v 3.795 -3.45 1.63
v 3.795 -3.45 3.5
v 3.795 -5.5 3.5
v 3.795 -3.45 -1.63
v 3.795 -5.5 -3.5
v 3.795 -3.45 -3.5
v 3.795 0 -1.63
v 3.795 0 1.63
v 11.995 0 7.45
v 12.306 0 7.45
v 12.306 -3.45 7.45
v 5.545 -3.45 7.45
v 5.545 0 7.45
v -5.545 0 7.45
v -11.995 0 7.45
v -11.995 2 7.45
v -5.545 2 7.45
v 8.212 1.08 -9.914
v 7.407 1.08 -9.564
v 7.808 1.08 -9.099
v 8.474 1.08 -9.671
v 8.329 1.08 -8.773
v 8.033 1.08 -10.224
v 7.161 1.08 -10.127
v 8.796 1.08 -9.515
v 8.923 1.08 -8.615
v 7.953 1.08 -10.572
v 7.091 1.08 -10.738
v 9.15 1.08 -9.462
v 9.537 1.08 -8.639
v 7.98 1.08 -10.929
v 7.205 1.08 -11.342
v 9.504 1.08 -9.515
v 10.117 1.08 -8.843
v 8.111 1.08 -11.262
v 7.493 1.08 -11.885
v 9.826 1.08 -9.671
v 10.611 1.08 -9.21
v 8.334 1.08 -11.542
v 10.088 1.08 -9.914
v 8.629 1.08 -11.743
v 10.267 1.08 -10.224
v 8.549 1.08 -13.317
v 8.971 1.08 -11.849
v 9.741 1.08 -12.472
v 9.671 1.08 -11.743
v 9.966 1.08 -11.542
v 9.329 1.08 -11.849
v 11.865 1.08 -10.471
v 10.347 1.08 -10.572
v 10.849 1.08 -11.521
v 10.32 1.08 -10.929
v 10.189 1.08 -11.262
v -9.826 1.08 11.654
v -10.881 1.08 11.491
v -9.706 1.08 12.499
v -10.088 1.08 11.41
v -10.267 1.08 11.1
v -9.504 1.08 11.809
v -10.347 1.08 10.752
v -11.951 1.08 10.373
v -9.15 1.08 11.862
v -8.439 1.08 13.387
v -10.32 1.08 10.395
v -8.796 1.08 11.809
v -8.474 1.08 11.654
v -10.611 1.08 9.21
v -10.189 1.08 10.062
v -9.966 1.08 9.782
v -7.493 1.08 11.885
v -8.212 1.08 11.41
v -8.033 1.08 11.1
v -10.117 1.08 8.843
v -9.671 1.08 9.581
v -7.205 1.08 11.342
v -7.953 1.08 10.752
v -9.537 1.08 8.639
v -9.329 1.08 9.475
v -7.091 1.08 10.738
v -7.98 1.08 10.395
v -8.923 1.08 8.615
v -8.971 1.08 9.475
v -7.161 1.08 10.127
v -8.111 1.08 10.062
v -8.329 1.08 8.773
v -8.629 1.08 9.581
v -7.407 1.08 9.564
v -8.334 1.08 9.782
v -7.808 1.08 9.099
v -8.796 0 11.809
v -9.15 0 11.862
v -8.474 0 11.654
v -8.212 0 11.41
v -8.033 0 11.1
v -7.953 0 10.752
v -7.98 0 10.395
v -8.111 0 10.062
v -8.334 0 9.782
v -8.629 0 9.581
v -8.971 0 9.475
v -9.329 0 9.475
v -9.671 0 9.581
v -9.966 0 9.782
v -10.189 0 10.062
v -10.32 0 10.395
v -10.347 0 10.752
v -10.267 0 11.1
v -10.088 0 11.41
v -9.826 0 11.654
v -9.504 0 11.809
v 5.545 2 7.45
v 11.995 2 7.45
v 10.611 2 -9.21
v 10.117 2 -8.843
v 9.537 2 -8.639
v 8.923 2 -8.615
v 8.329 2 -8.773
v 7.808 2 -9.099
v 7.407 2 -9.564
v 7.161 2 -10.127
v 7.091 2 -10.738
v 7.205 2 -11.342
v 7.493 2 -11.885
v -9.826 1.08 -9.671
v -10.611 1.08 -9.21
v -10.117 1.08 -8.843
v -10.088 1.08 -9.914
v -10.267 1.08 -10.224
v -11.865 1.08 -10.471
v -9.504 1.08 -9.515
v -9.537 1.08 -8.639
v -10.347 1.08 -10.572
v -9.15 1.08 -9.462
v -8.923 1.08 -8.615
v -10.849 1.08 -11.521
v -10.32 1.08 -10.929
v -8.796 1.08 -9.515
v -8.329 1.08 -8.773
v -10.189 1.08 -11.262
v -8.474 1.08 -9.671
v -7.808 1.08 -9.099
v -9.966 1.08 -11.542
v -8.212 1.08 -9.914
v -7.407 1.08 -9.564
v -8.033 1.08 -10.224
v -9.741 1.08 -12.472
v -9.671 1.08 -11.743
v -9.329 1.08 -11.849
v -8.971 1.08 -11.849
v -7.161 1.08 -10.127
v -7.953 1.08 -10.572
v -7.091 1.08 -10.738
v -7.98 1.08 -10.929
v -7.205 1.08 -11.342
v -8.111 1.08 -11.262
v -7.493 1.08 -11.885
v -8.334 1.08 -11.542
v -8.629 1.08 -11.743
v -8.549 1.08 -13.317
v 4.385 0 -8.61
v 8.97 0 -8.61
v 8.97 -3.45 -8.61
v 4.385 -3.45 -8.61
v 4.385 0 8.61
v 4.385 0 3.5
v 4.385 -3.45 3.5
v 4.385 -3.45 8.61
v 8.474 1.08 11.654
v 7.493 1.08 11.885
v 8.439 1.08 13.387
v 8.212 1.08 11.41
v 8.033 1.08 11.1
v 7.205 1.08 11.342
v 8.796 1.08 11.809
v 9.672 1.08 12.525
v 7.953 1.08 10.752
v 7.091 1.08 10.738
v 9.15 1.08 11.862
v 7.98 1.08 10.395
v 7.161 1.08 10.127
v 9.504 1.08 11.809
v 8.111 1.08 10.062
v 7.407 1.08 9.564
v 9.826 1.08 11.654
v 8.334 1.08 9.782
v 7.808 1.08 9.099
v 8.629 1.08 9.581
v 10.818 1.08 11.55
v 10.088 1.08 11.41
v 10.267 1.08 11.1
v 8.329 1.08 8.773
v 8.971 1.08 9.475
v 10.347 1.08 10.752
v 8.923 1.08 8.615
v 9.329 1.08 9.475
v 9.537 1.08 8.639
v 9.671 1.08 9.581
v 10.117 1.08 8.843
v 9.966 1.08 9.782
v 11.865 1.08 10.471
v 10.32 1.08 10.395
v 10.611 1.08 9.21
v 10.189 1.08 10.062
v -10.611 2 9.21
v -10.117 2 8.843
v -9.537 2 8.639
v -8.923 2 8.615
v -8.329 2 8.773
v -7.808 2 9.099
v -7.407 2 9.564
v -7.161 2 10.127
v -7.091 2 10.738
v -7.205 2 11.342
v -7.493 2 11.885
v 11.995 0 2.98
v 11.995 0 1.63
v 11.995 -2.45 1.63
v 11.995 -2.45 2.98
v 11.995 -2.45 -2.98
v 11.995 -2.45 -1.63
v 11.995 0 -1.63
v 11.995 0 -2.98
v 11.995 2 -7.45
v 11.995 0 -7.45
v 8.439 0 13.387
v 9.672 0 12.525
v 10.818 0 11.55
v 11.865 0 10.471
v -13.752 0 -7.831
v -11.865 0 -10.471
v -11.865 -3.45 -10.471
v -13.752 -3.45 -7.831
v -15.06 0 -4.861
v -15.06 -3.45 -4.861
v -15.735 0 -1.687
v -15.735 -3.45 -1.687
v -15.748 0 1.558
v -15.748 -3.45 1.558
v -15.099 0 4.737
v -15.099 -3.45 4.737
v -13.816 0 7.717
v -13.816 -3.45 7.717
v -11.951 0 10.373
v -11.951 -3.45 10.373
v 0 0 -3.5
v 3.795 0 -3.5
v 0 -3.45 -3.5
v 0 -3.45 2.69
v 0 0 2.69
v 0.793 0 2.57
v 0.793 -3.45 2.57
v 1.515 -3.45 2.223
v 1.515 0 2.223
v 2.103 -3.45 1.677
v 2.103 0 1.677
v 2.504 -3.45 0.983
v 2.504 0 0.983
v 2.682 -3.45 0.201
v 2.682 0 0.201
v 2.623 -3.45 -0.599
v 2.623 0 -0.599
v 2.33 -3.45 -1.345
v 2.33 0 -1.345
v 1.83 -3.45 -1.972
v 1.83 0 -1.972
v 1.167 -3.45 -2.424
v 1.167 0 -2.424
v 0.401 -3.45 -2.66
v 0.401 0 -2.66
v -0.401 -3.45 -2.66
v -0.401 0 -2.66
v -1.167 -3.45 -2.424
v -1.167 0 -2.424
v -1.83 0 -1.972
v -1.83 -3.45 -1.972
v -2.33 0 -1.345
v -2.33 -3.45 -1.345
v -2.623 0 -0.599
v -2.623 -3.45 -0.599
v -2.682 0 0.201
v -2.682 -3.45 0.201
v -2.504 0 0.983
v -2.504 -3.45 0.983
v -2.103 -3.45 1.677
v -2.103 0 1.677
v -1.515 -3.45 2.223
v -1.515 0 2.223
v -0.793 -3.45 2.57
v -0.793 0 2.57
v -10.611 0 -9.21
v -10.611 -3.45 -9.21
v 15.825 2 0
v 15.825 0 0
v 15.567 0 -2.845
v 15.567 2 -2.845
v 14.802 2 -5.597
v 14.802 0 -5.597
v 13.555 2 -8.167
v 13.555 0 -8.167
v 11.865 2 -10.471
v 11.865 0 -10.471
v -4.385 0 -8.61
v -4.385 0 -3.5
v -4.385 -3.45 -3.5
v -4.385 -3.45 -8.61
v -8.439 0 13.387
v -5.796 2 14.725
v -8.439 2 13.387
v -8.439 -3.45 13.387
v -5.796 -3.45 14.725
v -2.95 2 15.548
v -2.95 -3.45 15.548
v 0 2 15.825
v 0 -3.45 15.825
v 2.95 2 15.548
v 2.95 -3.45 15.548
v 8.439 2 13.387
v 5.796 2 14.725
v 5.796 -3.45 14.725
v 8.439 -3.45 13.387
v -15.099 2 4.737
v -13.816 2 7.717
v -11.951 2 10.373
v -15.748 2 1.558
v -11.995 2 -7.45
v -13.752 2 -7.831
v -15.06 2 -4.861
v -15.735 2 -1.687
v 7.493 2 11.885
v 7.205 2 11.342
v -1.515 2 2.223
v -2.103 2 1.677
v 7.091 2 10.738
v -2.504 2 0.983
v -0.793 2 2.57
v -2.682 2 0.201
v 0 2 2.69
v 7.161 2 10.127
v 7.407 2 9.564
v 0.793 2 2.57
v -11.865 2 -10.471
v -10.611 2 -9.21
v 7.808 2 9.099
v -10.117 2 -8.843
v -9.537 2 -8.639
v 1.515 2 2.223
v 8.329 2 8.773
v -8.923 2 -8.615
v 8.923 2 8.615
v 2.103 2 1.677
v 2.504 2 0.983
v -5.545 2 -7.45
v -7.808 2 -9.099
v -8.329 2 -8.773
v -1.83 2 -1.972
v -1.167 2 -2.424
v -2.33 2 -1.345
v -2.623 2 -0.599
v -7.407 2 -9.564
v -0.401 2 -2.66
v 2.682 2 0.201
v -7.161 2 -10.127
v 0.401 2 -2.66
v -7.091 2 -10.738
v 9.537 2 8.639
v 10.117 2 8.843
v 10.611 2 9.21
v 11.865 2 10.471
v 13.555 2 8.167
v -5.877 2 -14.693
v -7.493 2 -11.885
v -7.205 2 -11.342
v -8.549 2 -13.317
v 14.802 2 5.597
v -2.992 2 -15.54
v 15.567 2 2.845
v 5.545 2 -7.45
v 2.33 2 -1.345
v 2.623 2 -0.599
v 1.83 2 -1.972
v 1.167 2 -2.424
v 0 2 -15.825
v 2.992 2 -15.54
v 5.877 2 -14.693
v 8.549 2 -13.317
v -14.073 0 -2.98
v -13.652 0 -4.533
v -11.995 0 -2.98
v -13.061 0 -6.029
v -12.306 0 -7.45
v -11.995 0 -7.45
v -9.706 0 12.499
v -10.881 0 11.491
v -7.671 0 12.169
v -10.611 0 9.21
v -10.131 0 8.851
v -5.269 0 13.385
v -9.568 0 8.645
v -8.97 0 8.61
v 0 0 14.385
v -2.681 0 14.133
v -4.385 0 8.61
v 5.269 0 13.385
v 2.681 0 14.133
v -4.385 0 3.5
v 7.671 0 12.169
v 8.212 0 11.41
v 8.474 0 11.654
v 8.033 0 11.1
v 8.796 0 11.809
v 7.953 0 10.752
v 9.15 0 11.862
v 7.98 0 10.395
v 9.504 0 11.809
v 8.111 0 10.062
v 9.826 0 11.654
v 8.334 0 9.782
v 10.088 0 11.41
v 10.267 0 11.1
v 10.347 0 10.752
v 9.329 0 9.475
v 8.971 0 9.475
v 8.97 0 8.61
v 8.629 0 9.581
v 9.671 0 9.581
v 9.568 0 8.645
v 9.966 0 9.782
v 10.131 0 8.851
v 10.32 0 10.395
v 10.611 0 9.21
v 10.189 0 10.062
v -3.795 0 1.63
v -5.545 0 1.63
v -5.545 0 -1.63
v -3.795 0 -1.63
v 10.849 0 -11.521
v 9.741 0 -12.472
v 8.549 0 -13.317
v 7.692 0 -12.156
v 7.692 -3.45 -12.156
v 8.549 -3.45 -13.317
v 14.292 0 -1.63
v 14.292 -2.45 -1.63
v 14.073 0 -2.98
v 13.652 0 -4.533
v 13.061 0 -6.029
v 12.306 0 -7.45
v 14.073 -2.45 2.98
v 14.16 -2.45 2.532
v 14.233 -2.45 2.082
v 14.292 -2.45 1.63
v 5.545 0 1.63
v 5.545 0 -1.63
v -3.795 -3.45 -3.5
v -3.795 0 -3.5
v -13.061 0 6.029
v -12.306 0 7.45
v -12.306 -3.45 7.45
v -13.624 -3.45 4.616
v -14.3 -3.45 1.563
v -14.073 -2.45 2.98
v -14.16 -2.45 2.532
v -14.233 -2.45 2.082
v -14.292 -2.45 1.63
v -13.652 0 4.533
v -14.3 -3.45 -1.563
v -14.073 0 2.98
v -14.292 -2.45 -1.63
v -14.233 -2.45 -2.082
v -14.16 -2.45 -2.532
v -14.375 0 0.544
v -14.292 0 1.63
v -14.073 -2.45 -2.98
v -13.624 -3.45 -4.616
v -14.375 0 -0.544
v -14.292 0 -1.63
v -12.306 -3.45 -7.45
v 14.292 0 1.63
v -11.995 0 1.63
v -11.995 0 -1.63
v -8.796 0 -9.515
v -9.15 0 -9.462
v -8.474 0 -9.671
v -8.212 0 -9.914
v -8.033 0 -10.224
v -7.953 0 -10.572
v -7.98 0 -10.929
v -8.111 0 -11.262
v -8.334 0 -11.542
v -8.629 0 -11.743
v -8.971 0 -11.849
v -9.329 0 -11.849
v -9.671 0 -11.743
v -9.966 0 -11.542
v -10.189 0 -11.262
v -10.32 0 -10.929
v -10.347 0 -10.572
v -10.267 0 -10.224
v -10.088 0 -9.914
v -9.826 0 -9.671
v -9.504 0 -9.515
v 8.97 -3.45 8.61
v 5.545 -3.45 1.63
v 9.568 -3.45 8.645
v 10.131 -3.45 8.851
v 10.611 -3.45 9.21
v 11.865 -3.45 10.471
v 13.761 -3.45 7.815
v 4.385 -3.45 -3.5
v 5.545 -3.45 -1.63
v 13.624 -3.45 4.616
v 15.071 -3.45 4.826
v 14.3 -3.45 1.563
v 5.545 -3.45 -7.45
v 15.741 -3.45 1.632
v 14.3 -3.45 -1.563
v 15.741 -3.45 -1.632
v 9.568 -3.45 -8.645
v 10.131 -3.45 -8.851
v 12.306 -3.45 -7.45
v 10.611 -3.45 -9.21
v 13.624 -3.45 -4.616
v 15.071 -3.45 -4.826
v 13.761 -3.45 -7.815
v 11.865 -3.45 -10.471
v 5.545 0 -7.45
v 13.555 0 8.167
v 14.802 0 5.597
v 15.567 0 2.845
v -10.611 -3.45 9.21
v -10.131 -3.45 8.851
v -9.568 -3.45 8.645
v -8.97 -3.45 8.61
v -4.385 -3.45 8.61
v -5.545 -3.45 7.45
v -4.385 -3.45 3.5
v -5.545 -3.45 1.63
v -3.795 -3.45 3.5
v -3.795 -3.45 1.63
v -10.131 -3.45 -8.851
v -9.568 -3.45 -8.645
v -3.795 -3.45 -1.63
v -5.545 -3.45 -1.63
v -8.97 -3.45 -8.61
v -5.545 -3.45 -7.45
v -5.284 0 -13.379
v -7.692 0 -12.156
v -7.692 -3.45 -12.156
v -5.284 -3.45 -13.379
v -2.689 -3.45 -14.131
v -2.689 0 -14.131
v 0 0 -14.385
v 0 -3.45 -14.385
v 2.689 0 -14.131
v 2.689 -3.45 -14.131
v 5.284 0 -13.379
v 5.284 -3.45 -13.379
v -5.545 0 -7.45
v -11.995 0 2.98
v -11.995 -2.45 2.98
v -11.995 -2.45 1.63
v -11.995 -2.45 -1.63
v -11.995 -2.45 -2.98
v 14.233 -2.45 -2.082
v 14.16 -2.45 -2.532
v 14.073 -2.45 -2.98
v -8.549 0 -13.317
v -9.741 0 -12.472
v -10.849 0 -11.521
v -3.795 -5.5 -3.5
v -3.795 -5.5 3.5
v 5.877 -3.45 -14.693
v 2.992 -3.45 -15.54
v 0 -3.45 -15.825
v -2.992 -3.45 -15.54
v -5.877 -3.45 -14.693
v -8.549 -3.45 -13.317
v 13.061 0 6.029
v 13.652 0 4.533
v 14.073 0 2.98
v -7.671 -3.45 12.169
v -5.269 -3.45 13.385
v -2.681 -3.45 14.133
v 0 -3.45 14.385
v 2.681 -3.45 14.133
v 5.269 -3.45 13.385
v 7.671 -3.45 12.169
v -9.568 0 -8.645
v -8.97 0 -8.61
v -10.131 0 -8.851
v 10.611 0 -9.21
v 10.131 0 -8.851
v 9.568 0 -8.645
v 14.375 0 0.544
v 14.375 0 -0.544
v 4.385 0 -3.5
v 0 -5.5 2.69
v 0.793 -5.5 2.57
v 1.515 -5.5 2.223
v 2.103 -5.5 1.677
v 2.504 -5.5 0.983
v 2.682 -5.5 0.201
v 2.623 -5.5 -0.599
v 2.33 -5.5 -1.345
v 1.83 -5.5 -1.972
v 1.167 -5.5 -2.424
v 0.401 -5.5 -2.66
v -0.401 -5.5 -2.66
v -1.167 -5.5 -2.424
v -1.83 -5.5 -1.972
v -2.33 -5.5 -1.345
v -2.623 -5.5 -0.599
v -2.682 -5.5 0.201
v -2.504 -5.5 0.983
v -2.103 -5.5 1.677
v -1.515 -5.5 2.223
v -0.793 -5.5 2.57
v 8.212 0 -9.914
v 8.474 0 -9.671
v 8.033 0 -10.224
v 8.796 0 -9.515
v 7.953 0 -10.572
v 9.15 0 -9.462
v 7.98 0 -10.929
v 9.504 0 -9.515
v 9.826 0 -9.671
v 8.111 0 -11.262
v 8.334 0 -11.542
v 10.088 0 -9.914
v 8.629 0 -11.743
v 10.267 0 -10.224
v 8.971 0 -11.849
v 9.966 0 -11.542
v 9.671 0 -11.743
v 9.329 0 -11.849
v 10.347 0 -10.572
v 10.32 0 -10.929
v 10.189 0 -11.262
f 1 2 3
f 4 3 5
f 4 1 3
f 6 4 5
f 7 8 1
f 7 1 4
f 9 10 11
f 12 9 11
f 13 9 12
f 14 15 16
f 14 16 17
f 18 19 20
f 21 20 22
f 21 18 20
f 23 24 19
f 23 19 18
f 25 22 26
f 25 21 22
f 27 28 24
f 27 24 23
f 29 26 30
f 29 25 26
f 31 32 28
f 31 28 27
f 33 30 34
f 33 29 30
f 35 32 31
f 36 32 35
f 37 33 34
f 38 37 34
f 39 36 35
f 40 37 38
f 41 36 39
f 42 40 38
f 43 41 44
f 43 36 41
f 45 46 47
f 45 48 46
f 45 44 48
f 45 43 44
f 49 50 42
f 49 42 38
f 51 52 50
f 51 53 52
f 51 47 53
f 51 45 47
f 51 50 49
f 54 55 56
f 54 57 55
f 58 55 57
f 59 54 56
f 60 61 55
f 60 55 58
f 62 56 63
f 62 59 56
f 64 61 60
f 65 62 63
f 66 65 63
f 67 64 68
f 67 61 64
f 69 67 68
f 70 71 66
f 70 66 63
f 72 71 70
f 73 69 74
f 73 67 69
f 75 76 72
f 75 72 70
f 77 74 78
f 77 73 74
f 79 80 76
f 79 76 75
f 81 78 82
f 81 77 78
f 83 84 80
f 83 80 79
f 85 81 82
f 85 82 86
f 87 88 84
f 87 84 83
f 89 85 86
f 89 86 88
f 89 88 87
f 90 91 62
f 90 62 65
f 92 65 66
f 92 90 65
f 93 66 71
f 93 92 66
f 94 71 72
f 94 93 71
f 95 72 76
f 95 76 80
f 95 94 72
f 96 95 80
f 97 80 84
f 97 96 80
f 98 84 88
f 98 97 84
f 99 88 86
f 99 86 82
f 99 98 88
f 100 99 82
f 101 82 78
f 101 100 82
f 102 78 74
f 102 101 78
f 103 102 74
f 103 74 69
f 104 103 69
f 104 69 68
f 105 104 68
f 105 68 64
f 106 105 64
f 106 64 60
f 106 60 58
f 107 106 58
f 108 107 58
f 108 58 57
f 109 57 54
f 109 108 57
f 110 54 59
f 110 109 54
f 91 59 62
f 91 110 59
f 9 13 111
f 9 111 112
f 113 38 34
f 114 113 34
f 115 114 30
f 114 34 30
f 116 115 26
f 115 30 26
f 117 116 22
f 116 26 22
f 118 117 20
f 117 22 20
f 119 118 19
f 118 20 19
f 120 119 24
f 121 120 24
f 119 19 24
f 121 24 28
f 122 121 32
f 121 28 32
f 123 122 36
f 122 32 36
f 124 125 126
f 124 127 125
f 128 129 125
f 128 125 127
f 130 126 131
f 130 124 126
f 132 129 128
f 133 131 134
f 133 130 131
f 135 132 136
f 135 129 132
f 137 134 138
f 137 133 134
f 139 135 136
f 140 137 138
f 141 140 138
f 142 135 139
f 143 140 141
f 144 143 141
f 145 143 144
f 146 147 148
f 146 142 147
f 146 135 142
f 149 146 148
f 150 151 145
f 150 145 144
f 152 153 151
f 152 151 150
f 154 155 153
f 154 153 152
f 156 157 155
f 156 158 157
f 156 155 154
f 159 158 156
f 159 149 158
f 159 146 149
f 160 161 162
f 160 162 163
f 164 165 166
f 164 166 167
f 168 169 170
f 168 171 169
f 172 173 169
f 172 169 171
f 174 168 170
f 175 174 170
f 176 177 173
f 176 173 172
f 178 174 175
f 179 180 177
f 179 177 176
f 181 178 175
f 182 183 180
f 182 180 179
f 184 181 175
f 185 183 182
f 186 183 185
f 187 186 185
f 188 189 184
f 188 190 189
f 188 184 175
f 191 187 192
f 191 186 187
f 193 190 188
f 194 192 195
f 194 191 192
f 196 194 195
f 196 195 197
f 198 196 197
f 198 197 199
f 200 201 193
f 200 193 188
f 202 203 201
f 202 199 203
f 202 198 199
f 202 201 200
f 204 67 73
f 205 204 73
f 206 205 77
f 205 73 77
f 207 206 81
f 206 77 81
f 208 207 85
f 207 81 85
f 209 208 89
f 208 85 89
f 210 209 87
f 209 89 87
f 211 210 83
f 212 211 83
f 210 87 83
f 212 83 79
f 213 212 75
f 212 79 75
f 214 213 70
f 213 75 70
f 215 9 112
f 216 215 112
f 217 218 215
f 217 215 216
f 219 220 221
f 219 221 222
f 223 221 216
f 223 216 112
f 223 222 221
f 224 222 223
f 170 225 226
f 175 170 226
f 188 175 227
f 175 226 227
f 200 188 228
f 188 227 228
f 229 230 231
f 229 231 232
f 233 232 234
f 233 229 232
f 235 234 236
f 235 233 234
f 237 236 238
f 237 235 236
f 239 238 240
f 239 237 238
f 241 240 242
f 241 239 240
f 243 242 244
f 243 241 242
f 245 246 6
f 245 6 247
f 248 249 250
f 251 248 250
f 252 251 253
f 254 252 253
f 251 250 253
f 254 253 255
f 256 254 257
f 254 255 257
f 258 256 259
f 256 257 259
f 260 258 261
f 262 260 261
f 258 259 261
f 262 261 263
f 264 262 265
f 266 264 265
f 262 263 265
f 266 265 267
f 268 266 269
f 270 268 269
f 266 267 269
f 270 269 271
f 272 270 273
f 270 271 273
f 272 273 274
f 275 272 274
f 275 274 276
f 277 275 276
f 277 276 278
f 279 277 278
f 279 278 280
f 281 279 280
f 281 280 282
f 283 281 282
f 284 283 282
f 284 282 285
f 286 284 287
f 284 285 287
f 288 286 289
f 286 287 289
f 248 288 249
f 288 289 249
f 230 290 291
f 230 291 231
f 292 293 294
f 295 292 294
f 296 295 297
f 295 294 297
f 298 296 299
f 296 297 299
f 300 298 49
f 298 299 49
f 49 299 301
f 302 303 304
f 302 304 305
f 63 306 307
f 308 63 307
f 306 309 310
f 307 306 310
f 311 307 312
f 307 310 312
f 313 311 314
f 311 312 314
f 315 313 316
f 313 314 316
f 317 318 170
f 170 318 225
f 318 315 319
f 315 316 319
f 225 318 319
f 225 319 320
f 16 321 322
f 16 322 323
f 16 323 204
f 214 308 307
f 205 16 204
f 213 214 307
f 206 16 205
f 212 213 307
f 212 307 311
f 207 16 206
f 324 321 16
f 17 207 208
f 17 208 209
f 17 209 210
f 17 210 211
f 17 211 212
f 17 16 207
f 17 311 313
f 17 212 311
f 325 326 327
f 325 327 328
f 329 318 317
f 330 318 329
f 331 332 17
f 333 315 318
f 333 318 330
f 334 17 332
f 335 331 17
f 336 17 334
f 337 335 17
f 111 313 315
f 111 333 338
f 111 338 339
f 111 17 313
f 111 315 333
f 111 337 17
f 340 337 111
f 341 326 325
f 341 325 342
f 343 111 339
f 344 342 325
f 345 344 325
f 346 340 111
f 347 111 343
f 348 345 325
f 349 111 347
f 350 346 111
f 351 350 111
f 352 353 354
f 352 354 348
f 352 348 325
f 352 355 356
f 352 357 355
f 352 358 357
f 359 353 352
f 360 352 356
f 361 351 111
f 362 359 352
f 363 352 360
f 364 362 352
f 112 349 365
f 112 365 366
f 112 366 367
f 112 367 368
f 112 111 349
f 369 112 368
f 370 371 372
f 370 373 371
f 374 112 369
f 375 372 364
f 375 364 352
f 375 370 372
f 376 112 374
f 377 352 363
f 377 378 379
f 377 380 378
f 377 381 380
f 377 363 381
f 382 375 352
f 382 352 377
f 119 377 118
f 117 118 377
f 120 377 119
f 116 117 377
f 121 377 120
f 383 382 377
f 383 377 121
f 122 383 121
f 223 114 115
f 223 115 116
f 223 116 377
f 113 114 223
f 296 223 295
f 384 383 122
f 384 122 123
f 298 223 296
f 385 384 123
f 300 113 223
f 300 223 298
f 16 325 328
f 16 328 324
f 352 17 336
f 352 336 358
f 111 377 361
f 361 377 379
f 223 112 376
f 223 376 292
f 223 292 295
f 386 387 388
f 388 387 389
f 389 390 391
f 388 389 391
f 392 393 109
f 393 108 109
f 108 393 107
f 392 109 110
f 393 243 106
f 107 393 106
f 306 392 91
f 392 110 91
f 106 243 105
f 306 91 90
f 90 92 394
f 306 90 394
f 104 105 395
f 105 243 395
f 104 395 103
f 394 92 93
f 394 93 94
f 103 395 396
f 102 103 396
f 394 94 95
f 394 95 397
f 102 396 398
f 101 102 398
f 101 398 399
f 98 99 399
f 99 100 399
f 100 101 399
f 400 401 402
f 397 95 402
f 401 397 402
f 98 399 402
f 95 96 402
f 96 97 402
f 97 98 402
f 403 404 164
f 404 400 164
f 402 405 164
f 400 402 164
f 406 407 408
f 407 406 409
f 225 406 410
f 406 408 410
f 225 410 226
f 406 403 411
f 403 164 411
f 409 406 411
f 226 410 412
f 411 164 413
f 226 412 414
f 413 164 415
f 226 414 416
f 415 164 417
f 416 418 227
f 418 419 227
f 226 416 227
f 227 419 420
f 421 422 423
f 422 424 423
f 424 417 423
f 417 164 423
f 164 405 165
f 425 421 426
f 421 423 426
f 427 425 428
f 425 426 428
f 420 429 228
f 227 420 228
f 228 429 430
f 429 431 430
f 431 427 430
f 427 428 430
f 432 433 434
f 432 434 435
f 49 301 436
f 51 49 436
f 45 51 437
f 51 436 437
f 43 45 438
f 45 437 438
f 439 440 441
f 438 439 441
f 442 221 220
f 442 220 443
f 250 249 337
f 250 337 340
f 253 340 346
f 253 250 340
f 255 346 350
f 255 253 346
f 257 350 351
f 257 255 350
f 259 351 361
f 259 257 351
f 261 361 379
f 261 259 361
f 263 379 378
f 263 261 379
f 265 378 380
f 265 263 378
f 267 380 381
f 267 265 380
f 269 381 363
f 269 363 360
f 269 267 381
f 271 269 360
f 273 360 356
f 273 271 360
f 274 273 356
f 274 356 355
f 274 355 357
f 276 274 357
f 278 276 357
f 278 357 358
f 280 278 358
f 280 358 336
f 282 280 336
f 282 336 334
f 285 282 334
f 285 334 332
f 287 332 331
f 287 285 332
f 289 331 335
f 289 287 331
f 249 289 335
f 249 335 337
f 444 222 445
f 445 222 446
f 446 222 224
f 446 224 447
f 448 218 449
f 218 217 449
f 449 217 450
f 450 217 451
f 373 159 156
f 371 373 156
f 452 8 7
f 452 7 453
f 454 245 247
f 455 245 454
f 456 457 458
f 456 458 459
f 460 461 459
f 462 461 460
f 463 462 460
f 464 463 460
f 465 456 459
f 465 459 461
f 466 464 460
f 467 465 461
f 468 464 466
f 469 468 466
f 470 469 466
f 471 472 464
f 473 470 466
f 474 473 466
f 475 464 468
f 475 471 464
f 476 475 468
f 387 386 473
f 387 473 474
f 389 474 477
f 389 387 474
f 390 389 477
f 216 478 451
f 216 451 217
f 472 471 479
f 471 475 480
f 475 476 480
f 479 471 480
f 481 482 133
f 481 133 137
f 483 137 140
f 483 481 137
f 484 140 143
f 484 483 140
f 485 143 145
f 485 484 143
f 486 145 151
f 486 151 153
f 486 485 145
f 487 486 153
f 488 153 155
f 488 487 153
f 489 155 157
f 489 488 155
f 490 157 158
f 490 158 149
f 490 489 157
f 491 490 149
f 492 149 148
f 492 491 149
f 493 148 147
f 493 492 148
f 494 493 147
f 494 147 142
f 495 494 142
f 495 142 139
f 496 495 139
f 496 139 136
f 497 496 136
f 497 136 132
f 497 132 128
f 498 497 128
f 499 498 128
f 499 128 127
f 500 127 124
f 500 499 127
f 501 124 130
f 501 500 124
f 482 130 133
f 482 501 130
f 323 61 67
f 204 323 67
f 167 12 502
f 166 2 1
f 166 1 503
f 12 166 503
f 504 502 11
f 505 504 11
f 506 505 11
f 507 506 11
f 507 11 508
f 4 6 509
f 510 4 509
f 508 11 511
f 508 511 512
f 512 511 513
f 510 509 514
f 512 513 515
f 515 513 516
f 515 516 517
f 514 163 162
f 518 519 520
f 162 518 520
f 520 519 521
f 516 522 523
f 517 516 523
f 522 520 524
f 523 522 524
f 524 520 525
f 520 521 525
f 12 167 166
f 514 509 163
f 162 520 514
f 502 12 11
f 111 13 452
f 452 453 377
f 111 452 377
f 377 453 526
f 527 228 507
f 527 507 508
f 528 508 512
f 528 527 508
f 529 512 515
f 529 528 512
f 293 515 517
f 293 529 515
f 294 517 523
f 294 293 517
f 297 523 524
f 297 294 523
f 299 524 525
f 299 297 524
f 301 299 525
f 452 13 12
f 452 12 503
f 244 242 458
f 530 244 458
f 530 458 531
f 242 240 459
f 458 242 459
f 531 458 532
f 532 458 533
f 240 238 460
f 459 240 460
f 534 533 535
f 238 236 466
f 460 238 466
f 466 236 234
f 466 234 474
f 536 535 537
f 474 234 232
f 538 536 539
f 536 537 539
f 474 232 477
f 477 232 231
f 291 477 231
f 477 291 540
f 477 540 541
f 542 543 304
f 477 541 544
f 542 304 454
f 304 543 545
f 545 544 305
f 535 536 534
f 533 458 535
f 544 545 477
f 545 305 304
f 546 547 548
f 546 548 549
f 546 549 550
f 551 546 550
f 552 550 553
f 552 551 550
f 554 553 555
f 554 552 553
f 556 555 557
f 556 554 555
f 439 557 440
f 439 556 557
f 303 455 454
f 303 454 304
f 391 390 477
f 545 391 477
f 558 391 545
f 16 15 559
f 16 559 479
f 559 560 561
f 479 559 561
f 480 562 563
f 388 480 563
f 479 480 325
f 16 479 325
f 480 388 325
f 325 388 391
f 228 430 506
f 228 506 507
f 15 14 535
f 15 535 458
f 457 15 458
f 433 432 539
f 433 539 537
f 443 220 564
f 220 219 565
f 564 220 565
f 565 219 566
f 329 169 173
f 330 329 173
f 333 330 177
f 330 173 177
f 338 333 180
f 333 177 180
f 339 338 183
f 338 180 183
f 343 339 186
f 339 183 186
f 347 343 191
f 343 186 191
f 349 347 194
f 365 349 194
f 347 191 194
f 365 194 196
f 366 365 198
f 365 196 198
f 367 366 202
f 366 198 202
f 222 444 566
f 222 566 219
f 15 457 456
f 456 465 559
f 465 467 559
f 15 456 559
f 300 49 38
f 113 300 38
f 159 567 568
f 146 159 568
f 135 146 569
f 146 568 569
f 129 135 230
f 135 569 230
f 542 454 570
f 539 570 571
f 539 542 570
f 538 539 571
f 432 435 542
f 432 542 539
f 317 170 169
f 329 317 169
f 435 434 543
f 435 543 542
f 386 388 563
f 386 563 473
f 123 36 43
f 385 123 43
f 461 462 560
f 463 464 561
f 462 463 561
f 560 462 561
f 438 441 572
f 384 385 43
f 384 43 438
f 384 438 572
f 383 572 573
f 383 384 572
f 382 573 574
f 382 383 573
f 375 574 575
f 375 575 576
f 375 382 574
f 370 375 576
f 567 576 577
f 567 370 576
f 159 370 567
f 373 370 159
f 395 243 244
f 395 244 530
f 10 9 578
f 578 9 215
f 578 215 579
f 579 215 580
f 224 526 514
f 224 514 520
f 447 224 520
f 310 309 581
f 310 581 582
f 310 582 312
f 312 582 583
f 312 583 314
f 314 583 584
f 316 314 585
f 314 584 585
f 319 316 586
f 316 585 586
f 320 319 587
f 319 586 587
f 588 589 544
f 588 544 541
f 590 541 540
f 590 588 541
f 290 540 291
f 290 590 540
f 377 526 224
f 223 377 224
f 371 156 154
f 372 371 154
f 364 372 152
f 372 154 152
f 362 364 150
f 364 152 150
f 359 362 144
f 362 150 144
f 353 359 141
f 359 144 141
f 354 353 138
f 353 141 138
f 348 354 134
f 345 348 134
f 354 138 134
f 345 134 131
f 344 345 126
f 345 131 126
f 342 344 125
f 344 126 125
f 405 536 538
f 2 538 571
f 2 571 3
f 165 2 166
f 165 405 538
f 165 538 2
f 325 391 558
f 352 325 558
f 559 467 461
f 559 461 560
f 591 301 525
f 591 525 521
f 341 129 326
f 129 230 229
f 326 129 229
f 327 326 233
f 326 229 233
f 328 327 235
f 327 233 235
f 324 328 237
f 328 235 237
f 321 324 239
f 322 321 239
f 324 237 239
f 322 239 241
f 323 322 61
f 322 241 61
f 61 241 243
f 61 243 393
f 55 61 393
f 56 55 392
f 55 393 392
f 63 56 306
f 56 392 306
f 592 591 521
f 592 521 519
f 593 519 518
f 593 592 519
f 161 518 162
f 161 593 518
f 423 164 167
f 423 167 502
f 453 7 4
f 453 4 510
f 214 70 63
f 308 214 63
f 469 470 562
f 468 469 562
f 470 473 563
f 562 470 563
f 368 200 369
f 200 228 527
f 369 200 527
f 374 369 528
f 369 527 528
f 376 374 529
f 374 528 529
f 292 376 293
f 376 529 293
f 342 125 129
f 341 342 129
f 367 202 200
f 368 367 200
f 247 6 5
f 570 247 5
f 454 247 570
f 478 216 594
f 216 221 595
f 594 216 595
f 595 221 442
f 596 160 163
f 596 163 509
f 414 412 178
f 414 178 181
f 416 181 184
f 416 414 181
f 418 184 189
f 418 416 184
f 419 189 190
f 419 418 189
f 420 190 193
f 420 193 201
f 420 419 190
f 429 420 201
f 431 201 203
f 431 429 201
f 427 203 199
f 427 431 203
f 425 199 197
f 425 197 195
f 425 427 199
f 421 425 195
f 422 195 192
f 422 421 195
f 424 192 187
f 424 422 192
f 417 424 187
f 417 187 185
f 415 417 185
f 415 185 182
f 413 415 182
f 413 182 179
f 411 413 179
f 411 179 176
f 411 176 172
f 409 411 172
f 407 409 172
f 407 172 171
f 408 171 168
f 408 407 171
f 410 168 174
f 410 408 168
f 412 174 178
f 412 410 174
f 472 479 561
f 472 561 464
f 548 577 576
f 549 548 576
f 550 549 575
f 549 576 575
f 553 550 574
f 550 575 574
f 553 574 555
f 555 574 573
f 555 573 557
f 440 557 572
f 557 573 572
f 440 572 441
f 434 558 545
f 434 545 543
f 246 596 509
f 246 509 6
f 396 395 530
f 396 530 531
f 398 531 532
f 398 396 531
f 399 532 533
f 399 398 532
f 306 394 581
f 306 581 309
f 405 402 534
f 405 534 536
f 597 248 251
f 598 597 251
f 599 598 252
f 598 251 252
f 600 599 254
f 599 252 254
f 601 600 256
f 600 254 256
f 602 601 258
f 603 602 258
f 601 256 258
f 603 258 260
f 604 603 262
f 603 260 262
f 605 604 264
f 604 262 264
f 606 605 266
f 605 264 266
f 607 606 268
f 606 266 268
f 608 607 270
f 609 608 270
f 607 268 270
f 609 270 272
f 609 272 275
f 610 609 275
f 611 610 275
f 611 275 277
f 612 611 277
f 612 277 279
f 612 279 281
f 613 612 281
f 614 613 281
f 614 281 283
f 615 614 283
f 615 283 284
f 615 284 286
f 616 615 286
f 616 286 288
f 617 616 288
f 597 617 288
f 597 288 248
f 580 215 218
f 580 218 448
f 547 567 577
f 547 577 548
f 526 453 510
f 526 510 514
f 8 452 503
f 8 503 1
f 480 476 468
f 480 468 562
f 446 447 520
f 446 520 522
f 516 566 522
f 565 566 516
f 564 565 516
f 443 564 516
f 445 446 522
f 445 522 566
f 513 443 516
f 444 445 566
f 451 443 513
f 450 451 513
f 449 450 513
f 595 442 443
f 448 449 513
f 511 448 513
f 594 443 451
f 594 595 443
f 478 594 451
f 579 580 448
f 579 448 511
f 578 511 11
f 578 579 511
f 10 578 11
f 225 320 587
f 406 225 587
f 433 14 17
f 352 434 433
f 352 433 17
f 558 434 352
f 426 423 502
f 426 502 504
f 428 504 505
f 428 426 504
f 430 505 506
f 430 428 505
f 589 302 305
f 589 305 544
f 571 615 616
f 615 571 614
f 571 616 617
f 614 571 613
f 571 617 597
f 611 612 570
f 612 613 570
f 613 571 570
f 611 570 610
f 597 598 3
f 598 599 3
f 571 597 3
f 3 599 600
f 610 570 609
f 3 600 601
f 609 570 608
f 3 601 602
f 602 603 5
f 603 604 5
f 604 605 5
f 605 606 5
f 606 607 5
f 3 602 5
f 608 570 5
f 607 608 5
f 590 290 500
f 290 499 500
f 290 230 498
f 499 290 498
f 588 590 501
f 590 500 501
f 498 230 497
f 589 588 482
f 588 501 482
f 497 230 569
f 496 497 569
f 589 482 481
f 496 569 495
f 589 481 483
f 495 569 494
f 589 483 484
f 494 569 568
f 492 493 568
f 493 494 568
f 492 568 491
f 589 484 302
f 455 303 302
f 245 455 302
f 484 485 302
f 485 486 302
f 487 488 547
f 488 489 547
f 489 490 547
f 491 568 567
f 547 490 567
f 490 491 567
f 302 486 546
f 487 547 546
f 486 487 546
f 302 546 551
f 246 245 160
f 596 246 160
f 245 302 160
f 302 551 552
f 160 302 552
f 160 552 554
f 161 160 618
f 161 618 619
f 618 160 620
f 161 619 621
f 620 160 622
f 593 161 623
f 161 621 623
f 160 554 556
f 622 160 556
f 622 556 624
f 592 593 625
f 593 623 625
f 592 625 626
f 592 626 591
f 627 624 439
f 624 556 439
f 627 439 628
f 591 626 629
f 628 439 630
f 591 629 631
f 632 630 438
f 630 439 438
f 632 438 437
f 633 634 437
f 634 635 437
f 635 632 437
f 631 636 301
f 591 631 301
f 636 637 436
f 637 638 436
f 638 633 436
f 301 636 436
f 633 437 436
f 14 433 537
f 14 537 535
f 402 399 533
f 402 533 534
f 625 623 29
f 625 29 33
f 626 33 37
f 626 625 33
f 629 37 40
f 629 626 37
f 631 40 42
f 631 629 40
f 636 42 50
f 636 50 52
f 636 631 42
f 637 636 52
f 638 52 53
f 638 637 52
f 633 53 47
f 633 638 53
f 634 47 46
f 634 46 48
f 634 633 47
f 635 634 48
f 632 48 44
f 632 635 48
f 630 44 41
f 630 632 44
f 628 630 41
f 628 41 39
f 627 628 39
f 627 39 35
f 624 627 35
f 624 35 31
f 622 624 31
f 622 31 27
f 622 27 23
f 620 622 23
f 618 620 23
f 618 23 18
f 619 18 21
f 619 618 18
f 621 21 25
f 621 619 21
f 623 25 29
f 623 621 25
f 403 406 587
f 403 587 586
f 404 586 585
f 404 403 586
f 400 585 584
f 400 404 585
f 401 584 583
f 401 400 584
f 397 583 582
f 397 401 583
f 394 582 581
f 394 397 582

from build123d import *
from build123d.topology import SkipClean

# Parameters (mm, degrees)
SKETCH1_W           = 6.45
SKETCH1_H           = 14.9
SKETCH1_R           = 2.69
BOSS_EXTRUDE1_DEPTH = 2
SKETCH1_4_R         = 1.2
BOSS_EXTRUDE2_DEPTH = 1.08
SKETCH2_R           = 2.69
BOSS_EXTRUDE3_DEPTH = 3.45
BOSS_EXTRUDE4_START = -3.45
BOSS_EXTRUDE4_DEPTH = 3.45
BOSS_EXTRUDE5_START = -2.45
BOSS_EXTRUDE5_DEPTH = 2.45
BOSS_EXTRUDE6_START = -3.45
SKETCH2_5_R         = 2.69
BOSS_EXTRUDE6_DEPTH = 3.45
BOSS_EXTRUDE7_START = -5.5
SKETCH2_6_W         = 7.59
SKETCH2_6_H         = 7
SKETCH2_6_R         = 2.69
BOSS_EXTRUDE7_DEPTH = 5.5


with BuildPart() as part:
    # Sketch1 → Boss-Extrude1 (new body)
    with BuildSketch(Plane(origin=(0, 0, 0), x_dir=(1, 0, 0), z_dir=(0, 1, 0))):
        with BuildLine():
            ThreePointArc((-7.492590556, 11.885435909), (-7.808434164, 9.098816182), (-10.610710111, 9.209523926))
            Line((-10.610710111, 9.209523926), (-11.865304556, 10.471159095))
            ThreePointArc((-11.865304556, 10.471159095), (-15.824865609, 0.065218614), (-11.951209075, -10.373004706))
            Line((-11.951209075, -10.373004706), (-10.610710111, -9.209523926))
            ThreePointArc((-10.610710111, -9.209523926), (-7.808434164, -9.098816182), (-7.492590556, -11.885435909))
            Line((-7.492590556, -11.885435909), (-8.439163385, -13.386976745))
            ThreePointArc((-8.439163385, -13.386976745), (0, -15.825), (8.439163385, -13.386976745))
            Line((8.439163385, -13.386976745), (7.492590556, -11.885435909))
            ThreePointArc((7.492590556, -11.885435909), (7.808434164, -9.098816182), (10.610710111, -9.209523926))
            Line((10.610710111, -9.209523926), (11.865304556, -10.471159095))
            ThreePointArc((11.865304556, -10.471159095), (14.802011174, -5.597418173), (15.825, 0))
            ThreePointArc((15.825, 0), (14.802011174, 5.597418173), (11.865304556, 10.471159095))
            Line((11.865304556, 10.471159095), (10.610710111, 9.209523926))
            ThreePointArc((10.610710111, 9.209523926), (7.808434164, 9.098816182), (7.492590556, 11.885435909))
            Line((7.492590556, 11.885435909), (8.549217648, 13.316962965))
            ThreePointArc((8.549217648, 13.316962965), (0, 15.825), (-8.549217648, 13.316962965))
            Line((-8.549217648, 13.316962965), (-7.492590556, 11.885435909))
        make_face()
        with Locations((-8.77, 0)):
            Rectangle(SKETCH1_W, SKETCH1_H, mode=Mode.SUBTRACT)
        Circle(SKETCH1_R, mode=Mode.SUBTRACT)
        with Locations((8.77, 0)):
            Rectangle(SKETCH1_W, SKETCH1_H, mode=Mode.SUBTRACT)
    extrude(amount=BOSS_EXTRUDE1_DEPTH)

    # Sketch1<4> → Boss-Extrude2 (add)
    # profile 1 of 4: a face of its own
    with BuildSketch(Plane(origin=(0, 0, 0), x_dir=(1, 0, 0), z_dir=(0, 1, 0))):
        with BuildLine():
            Line((-11.865304556, 10.471159095), (-10.610710111, 9.209523926))
            ThreePointArc((-10.610710111, 9.209523926), (-7.808434164, 9.098816182), (-7.492590556, 11.885435909))
            Line((-7.492590556, 11.885435909), (-8.549217648, 13.316962965))
            ThreePointArc((-8.549217648, 13.316962965), (-10.305960854, 12.009071399), (-11.865304556, 10.471159095))
        make_face()
        with Locations((-9.15, 10.662082348)):
            Circle(SKETCH1_4_R, mode=Mode.SUBTRACT)
    # profile 2 of 4: a face of its own
    with BuildSketch(Plane(origin=(0, 0, 0), x_dir=(1, 0, 0), z_dir=(0, 1, 0))):
        with BuildLine():
            Line((-10.610710111, -9.209523926), (-11.951209075, -10.373004706))
            ThreePointArc((-11.951209075, -10.373004706), (-10.305960854, -12.009071399), (-8.439163385, -13.386976745))
            Line((-8.439163385, -13.386976745), (-7.492590556, -11.885435909))
            ThreePointArc((-7.492590556, -11.885435909), (-7.808434164, -9.098816182), (-10.610710111, -9.209523926))
        make_face()
        with Locations((-9.15, -10.662082348)):
            Circle(SKETCH1_4_R, mode=Mode.SUBTRACT)
    # profile 3 of 4: a face of its own
    with BuildSketch(Plane(origin=(0, 0, 0), x_dir=(1, 0, 0), z_dir=(0, 1, 0))):
        with BuildLine():
            ThreePointArc((11.865304556, 10.471159095), (10.305960854, 12.009071399), (8.549217648, 13.316962965))
            Line((8.549217648, 13.316962965), (7.492590556, 11.885435909))
            ThreePointArc((7.492590556, 11.885435909), (7.808434164, 9.098816182), (10.610710111, 9.209523926))
            Line((10.610710111, 9.209523926), (11.865304556, 10.471159095))
        make_face()
        with Locations((9.15, 10.662082348)):
            Circle(SKETCH1_4_R, mode=Mode.SUBTRACT)
    # profile 4 of 4: a face of its own
    with BuildSketch(Plane(origin=(0, 0, 0), x_dir=(1, 0, 0), z_dir=(0, 1, 0))):
        with BuildLine():
            Line((7.492590556, -11.885435909), (8.439163385, -13.386976745))
            ThreePointArc((8.439163385, -13.386976745), (10.256381074, -12.051442746), (11.865304556, -10.471159095))
            Line((11.865304556, -10.471159095), (10.610710111, -9.209523926))
            ThreePointArc((10.610710111, -9.209523926), (7.808434164, -9.098816182), (7.492590556, -11.885435909))
        make_face()
        with Locations((9.15, -10.662082348)):
            Circle(SKETCH1_4_R, mode=Mode.SUBTRACT)
    extrude(amount=BOSS_EXTRUDE2_DEPTH)

    # Sketch2<3> → Boss-Extrude4 (add)
    with BuildSketch(Plane(origin=(0, 0, 0), x_dir=(1, 0, 0), z_dir=(0, 1, 0)).offset(BOSS_EXTRUDE4_START)):
        with BuildLine():
            Line((-8.549217648, 13.316962965), (-7.692058181, 12.155676285))
            ThreePointArc((-7.692058181, 12.155676285), (0, 14.385), (7.692058181, 12.155676285))
            Line((7.692058181, 12.155676285), (8.549217648, 13.316962965))
            ThreePointArc((8.549217648, 13.316962965), (0, 15.825), (-8.549217648, 13.316962965))
        make_face()
        with BuildLine():
            ThreePointArc((7.671239513, -12.168825307), (0, -14.385), (-7.671239513, -12.168825307))
            Line((-7.671239513, -12.168825307), (-8.439163385, -13.386976745))
            ThreePointArc((-8.439163385, -13.386976745), (0, -15.825), (8.439163385, -13.386976745))
            Line((8.439163385, -13.386976745), (7.671239513, -12.168825307))
        make_face()
    extrude(amount=BOSS_EXTRUDE4_DEPTH)

    # Sketch2<4> → Boss-Extrude5 (add)
    with BuildSketch(Plane(origin=(0, 0, 0), x_dir=(1, 0, 0), z_dir=(0, 1, 0)).offset(BOSS_EXTRUDE5_START)):
        with BuildLine():
            Line((-11.995, 1.63), (-11.995, 2.98))
            Line((-11.995, 2.98), (-14.072946564, 2.98))
            ThreePointArc((-14.072946564, 2.98), (-14.198702945, 2.307609084), (-14.292351976, 1.63))
            Line((-14.292351976, 1.63), (-11.995, 1.63))
        make_face()
        with BuildLine():
            Line((-11.995, -2.98), (-11.995, -1.63))
            Line((-11.995, -1.63), (-14.292351976, -1.63))
            ThreePointArc((-14.292351976, -1.63), (-14.198702945, -2.307609084), (-14.072946564, -2.98))
            Line((-14.072946564, -2.98), (-11.995, -2.98))
        make_face()
        with BuildLine():
            ThreePointArc((14.292351976, 1.63), (14.198702945, 2.307609084), (14.072946564, 2.98))
            Line((14.072946564, 2.98), (11.995, 2.98))
            Line((11.995, 2.98), (11.995, 1.63))
            Line((11.995, 1.63), (14.292351976, 1.63))
        make_face()
        with BuildLine():
            Line((11.995, -2.98), (14.072946564, -2.98))
            ThreePointArc((14.072946564, -2.98), (14.198702945, -2.307609084), (14.292351976, -1.63))
            Line((14.292351976, -1.63), (11.995, -1.63))
            Line((11.995, -1.63), (11.995, -2.98))
        make_face()
    extrude(amount=BOSS_EXTRUDE5_DEPTH)

    # Sketch2<5> → Boss-Extrude6 (add)
    with BuildSketch(Plane(origin=(0, 0, 0), x_dir=(1, 0, 0), z_dir=(0, 1, 0)).offset(BOSS_EXTRUDE6_START)):
        with BuildLine():
            ThreePointArc((3.5, 0), (2.474873734, 2.474873734), (0, 3.5))
            ThreePointArc((0, 3.5), (-3.5, 0), (0, -3.5))
            ThreePointArc((0, -3.5), (2.474873734, -2.474873734), (3.5, 0))
        make_face()
        Circle(SKETCH2_5_R, mode=Mode.SUBTRACT)
    extrude(amount=BOSS_EXTRUDE6_DEPTH)



with BuildPart() as body_2:
    # Sketch2 → Boss-Extrude3 (new body)
    with BuildSketch(Plane(origin=(0, 0, 0), x_dir=(1, 0, 0), z_dir=(0, 1, 0))):
        with BuildLine():
            Line((-4.385, -3.5), (4.385, -3.5))
            Line((4.385, -3.5), (4.385, -8.61))
            Line((4.385, -8.61), (8.969561545, -8.61))
            ThreePointArc((8.969561545, -8.61), (9.85684589, -8.727148528), (10.610710111, -9.209523926))
            Line((10.610710111, -9.209523926), (11.865304556, -10.471159095))
            ThreePointArc((11.865304556, -10.471159095), (15.825, 0), (11.865304556, 10.471159095))
            Line((11.865304556, 10.471159095), (10.610710111, 9.209523926))
            ThreePointArc((10.610710111, 9.209523926), (9.85684589, 8.727148528), (8.969561545, 8.61))
            Line((8.969561545, 8.61), (4.385, 8.61))
            Line((4.385, 8.61), (4.385, 3.5))
            Line((4.385, 3.5), (-4.385, 3.5))
            Line((-4.385, 3.5), (-4.385, 8.61))
            Line((-4.385, 8.61), (-8.969561545, 8.61))
            ThreePointArc((-8.969561545, 8.61), (-9.85684589, 8.727148528), (-10.610710111, 9.209523926))
            Line((-10.610710111, 9.209523926), (-11.865304556, 10.471159095))
            ThreePointArc((-11.865304556, 10.471159095), (-15.824865609, 0.065218614), (-11.951209075, -10.373004706))
            Line((-11.951209075, -10.373004706), (-10.610710111, -9.209523926))
            ThreePointArc((-10.610710111, -9.209523926), (-9.85684589, -8.727148528), (-8.969561545, -8.61))
            Line((-8.969561545, -8.61), (-4.385, -8.61))
            Line((-4.385, -8.61), (-4.385, -3.5))
        make_face()
        with BuildLine():
            Line((-5.545, 7.45), (-5.545, 1.63))
            Line((-5.545, 1.63), (-3.795, 1.63))
            Line((-3.795, 1.63), (-3.795, -1.63))
            Line((-3.795, -1.63), (-5.545, -1.63))
            Line((-5.545, -1.63), (-5.545, -7.45))
            Line((-5.545, -7.45), (-12.30551604, -7.45))
            ThreePointArc((-12.30551604, -7.45), (-14.385, 0), (-12.30551604, 7.45))
            Line((-12.30551604, 7.45), (-5.545, 7.45))
        make_face(mode=Mode.SUBTRACT)
        Circle(SKETCH2_R, mode=Mode.SUBTRACT)
        with BuildLine():
            Line((3.795, -1.63), (3.795, 1.63))
            Line((3.795, 1.63), (5.545, 1.63))
            Line((5.545, 1.63), (5.545, 7.45))
            Line((5.545, 7.45), (12.30551604, 7.45))
            ThreePointArc((12.30551604, 7.45), (14.385, 0), (12.30551604, -7.45))
            Line((12.30551604, -7.45), (5.545, -7.45))
            Line((5.545, -7.45), (5.545, -1.63))
            Line((5.545, -1.63), (3.795, -1.63))
        make_face(mode=Mode.SUBTRACT)
    extrude(amount=-BOSS_EXTRUDE3_DEPTH)


with BuildPart() as part_1:
    with SkipClean():  # the faces are left unmerged after this step: merging them gives an invalid solid
        add(part.part)

        add(body_2.part)  # Boss-Extrude7 merges body 2
        # Sketch2<6> → Boss-Extrude7 (add)
        with BuildSketch(Plane(origin=(0, 0, 0), x_dir=(1, 0, 0), z_dir=(0, 1, 0)).offset(BOSS_EXTRUDE7_START)):
            Rectangle(SKETCH2_6_W, SKETCH2_6_H)
            Circle(SKETCH2_6_R, mode=Mode.SUBTRACT)
        extrude(amount=BOSS_EXTRUDE7_DEPTH)


solid = part_1.part
